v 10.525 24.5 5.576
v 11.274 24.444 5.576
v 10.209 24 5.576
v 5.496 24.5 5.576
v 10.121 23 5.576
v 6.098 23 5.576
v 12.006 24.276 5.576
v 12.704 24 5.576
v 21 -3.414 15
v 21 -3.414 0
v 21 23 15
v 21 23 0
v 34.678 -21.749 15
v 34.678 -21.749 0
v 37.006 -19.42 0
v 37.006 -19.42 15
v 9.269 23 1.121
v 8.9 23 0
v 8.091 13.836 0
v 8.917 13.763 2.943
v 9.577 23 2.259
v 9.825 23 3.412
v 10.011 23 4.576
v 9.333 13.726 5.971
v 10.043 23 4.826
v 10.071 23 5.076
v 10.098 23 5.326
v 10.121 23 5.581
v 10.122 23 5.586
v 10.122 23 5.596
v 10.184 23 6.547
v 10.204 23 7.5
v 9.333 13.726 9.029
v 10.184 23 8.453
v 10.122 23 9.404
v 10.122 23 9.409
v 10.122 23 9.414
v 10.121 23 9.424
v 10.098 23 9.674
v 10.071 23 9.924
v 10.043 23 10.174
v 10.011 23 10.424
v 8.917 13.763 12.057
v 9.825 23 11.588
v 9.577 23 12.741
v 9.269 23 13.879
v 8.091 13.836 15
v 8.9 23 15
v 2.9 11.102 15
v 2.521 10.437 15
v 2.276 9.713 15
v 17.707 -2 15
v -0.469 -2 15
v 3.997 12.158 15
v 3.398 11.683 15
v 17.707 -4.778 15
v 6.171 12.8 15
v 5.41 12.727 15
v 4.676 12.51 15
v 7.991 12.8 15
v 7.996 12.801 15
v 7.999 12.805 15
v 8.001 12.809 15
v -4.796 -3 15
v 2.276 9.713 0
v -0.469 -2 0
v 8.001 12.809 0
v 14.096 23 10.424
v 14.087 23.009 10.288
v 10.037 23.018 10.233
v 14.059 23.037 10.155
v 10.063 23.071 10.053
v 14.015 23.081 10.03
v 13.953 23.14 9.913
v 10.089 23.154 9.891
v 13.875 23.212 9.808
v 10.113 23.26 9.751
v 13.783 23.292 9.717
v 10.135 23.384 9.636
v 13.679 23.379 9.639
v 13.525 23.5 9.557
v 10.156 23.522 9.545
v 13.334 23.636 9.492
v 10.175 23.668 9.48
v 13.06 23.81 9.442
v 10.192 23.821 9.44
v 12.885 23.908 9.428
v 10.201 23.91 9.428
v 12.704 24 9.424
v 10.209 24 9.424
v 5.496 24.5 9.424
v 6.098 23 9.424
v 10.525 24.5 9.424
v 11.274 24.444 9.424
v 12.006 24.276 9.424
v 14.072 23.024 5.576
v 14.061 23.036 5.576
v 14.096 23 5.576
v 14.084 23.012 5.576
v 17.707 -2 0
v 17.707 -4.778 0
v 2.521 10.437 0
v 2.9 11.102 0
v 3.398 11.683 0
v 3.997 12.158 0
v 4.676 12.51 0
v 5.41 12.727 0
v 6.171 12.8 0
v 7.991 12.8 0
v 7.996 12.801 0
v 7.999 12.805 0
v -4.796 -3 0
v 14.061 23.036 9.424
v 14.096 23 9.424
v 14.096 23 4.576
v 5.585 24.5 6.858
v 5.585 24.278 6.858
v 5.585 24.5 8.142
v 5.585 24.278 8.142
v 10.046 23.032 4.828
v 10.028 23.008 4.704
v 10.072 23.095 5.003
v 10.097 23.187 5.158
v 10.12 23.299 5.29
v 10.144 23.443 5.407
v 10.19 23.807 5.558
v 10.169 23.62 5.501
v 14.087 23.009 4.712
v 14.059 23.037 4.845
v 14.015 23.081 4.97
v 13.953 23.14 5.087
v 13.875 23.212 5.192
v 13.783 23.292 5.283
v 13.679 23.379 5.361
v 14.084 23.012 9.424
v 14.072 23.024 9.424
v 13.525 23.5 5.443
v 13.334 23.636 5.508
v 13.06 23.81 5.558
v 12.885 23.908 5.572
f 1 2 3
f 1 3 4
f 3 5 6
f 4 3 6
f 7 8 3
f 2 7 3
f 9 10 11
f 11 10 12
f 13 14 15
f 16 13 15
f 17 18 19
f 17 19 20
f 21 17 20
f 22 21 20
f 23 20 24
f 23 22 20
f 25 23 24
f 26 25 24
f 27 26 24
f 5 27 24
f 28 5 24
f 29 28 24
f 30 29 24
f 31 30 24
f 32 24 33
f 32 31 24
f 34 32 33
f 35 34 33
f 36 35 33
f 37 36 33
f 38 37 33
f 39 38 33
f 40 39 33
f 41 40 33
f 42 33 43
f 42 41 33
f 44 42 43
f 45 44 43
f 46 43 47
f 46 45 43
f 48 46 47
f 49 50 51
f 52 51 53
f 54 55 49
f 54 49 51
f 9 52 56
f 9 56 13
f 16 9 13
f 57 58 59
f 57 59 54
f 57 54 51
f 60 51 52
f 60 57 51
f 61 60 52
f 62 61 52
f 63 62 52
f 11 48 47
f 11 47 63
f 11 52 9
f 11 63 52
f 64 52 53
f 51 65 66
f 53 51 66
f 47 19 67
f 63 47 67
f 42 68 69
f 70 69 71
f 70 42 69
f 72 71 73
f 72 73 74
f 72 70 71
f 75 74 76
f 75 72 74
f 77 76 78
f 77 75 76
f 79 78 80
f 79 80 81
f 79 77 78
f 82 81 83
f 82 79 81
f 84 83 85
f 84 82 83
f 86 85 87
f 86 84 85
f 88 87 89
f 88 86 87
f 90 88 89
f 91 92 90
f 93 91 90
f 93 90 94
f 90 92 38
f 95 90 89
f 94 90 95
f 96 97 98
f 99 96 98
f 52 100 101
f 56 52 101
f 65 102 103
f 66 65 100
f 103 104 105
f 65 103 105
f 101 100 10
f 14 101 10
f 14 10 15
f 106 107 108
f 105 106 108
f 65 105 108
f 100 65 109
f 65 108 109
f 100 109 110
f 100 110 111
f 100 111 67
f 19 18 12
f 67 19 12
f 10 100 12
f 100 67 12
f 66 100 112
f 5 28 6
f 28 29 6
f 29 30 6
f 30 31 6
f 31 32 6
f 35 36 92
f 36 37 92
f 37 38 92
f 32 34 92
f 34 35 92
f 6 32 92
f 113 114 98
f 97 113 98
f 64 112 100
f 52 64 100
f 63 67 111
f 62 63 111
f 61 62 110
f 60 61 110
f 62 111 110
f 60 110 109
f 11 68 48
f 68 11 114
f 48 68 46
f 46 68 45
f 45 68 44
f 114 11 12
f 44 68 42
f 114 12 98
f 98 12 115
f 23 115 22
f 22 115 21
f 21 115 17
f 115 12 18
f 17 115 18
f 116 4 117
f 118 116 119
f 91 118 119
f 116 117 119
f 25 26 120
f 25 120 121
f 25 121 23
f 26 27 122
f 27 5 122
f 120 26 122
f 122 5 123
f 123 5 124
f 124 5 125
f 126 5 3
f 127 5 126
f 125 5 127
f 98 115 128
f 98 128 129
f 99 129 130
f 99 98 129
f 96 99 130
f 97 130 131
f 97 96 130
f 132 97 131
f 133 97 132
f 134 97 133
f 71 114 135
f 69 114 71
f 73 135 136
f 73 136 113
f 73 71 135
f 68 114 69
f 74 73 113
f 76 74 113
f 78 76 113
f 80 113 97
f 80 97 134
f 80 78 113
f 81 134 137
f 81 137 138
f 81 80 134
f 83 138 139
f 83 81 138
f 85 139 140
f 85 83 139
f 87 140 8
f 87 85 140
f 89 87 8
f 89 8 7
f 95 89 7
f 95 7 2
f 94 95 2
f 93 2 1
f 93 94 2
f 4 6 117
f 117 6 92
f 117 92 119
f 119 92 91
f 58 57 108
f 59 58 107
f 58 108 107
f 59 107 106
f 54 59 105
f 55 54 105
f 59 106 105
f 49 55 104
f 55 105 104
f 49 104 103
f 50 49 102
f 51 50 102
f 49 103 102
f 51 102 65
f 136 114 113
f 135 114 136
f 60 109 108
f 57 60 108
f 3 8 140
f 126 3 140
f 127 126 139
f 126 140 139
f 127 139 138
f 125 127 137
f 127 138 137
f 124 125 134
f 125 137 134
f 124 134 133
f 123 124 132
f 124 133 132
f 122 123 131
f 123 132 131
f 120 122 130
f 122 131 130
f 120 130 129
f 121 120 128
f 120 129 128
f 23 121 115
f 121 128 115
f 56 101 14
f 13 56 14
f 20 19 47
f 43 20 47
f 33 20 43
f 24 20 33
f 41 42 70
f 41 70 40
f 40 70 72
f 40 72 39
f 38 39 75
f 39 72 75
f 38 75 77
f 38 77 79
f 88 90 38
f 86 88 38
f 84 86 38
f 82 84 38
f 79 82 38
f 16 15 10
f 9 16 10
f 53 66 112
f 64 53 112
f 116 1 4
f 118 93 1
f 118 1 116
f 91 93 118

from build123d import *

# Parameters (mm, degrees)
F1_DEPTH      = 15
F4_DEPTH      = 9.2
F4_DEPTH_BACK = 1
F7_DEPTH      = 1.5
F8_SIZE       = 1.49999
F9_R          = 5
F11_DEPTH     = 4
F12_T4_DEPTH  = 6.4753623201
F12_S5_R      = 22.299103121
F12_T6_DEPTH  = 5
F12_S8_R      = 5
F12_T9_DEPTH  = 5
F12_T13_DEPTH = 6.4753623415
F12_S15_R     = 5
F12_T16_DEPTH = 5
F12_S17_R     = 22.299103121
F12_T18_DEPTH = 5


# Not quite as in the source:
# - a fillet or chamfer that OpenCascade refuses, or shapes differently, is made with other operations: its cross-section is extruded or revolved along the edge and cut away or added
# - a fillet or chamfer is up to 0.001 mm smaller than in the source, because OpenCascade refuses the exact size


with BuildPart() as f1:
    # F0 (on Top) → F1 (new body)
    with BuildSketch(Plane.XY):
        with BuildLine():
            Line((37.0060966544, -19.4203102168), (21, -3.4142135624))
            Line((21, -3.4142135624), (21, 23))
            Line((21, 23), (8.9, 23))
            Line((8.9, 23), (8.0008047996, 12.8091210619))
            ThreePointArc((8.0008047996, 12.8091210619), (7.9975966714, 12.8026247244), (7.9908435011, 12.8))
            Line((7.9908435011, 12.8), (6.1708946074, 12.8))
            ThreePointArc((6.1708946074, 12.8), (3.6860466407, 11.9345702389), (2.2764293651, 9.7127652912))
            Line((2.2764293651, 9.7127652912), (-0.46875, -2))
            Line((-0.46875, -2), (-4.7960747033, -3))
            Line((-4.7960747033, -3), (17.7071067812, -2))
            Line((17.7071067812, -2), (17.7071067812, -4.7781745931))
            Line((17.7071067812, -4.7781745931), (34.6776695297, -21.7487373415))
            Line((34.6776695297, -21.7487373415), (37.0060966544, -19.4203102168))
        make_face()
    extrude(amount=F1_DEPTH)

    # F3 (on face) → F4 (cut, two sides)
    with BuildSketch(Plane(origin=(2.0824892704, 23.6015450644, 0), x_dir=(0.99612985, -0.0878938103, 0), z_dir=(-0.0878938103, -0.99612985, 0))) as f4_sk:
        with BuildLine():
            Line((6.8439980284, 15), (6.8439980284, 0))
            ThreePointArc((6.8439980284, 0), (8.1431011494, 7.5), (6.8439980284, 15))
        make_face()
    extrude(amount=F4_DEPTH, mode=Mode.SUBTRACT)
    extrude(f4_sk.sketch, amount=-F4_DEPTH_BACK, mode=Mode.SUBTRACT)

    # F6 (on offset) → F7 (join)
    with BuildSketch(Plane(origin=(0, 23, 0), x_dir=(-1, 0, 0), z_dir=(0, 1, 0))):
        with BuildLine():
            ThreePointArc((-7.0033527857, 9.4235612132), (-7.0960699027, 7.4999998768), (-7.0033527857, 5.5764385404))
            Line((-7.0033527857, 5.5764385404), (-5.4957957644, 5.5764385404))
            ThreePointArc((-5.4957957644, 5.5764385404), (-5.5960699027, 7.4999998768), (-5.4957957644, 9.4235612132))
            Line((-5.4957957644, 9.4235612132), (-7.0033527857, 9.4235612132))
        make_face()
        with BuildLine():
            Line((-14.0960699027, 7.4999998768), (-14.0960699027, 5.5764385404))
            Line((-14.0960699027, 5.5764385404), (-7.0033527857, 5.5764385404))
            ThreePointArc((-7.0033527857, 5.5764385404), (-7.0960699027, 7.4999998768), (-7.0033527857, 9.4235612132))
            Line((-7.0033527857, 9.4235612132), (-14.0960699027, 9.4235612132))
            Line((-14.0960699027, 9.4235612132), (-14.0960699027, 7.4999998768))
        make_face()
    extrude(amount=F7_DEPTH)

    # F8 (size 1.5 in the source; OpenCascade refuses exactly that, so slightly less here)
    f8_edges = [f1.edges().sort_by_distance(p)[0] for p in [
        (14.09607, 24.5, 7.5),
    ]]
    chamfer(f8_edges, length=F8_SIZE)

    # F9
    f9_edges = [f1.edges().sort_by_distance(p)[0] for p in [
        (12.59608, 24.5, 7.5),
    ]]
    fillet(f9_edges, radius=F9_R)

    # F10 (on face) → F11 (cut)
    with BuildSketch(Plane.XY.offset(9.4235612132)):
        Polygon((5.4957957644, 22), (6.5002299745, 22), (5.4957957644, 24.5), align=None)
    extrude(amount=-F11_DEPTH, mode=Mode.SUBTRACT)

    # F12: fillet of radius 1 on 3 edges, made by hand


with BuildPart() as f12_tool2:
    # F12_s3 → F12_t4 (new body)
    with BuildSketch(Plane.YZ.offset(7.6207075826)):
        with BuildLine():
            ThreePointArc((23, 10.4235612132), (23.2928932188, 9.716454432), (24, 9.4235612132))
            Line((24, 9.4235612132), (24, 9.4035612132))
            Line((24, 9.4035612132), (22.98, 9.4035612132))
            Line((22.98, 9.4035612132), (22.98, 10.4235612132))
            Line((22.98, 10.4235612132), (23, 10.4235612132))
        make_face()
    extrude(amount=F12_T4_DEPTH)

    # F12_s5 → F12_t6 (cut, symmetric)
    with BuildSketch(Plane(origin=(2.1446089712, 24.3055683406, 0), x_dir=(0, 0, 1), z_dir=(0.0878938103, 0.99612985, 0))):
        with Locations((7.5, -14.1560019716)):
            Circle(F12_S5_R)
    extrude(amount=F12_T6_DEPTH, both=True, mode=Mode.SUBTRACT)

    split(bisect_by=Plane.XZ.offset(-23), keep=Keep.BOTTOM)

    # F12_s8 → F12_t9 (intersect, symmetric)
    with BuildSketch(Plane.XY.offset(9.9)):
        with Locations((10.5250120908, 19.5)):
            Circle(F12_S8_R)
    extrude(amount=F12_T9_DEPTH, both=True, mode=Mode.INTERSECT)


with BuildPart() as f1_1:
    add(f1.part)

    # F12_t1: union F12_tool2
    add(f12_tool2.part)


with BuildPart() as f12_tool11:
    # F12_s12 → F12_t13 (new body)
    with BuildSketch(Plane.YZ.offset(14.0960699027)):
        with BuildLine():
            ThreePointArc((24, 5.5764385404), (23.2928932188, 5.2835453216), (23, 4.5764385404))
            Line((23, 4.5764385404), (22.98, 4.5764385404))
            Line((22.98, 4.5764385404), (22.98, 5.5964385404))
            Line((22.98, 5.5964385404), (24, 5.5964385404))
            Line((24, 5.5964385404), (24, 5.5764385404))
        make_face()
    extrude(amount=-F12_T13_DEPTH)

    split(bisect_by=Plane.XZ.offset(-23), keep=Keep.BOTTOM)

    # F12_s15 → F12_t16 (intersect, symmetric)
    with BuildSketch(Plane.XY.offset(5.1)):
        with Locations((10.5250120908, 19.5)):
            Circle(F12_S15_R)
    extrude(amount=F12_T16_DEPTH, both=True, mode=Mode.INTERSECT)

    # F12_s17 → F12_t18 (cut, symmetric)
    with BuildSketch(Plane(origin=(2.1446089712, 24.3055683406, 0), x_dir=(0, 0, 1), z_dir=(0.0878938103, 0.99612985, 0))):
        with Locations((7.5, -14.1560019716)):
            Circle(F12_S17_R)
    extrude(amount=F12_T18_DEPTH, both=True, mode=Mode.SUBTRACT)


with BuildPart() as f1_2:
    add(f1_1.part)

    # F12_t10: union F12_tool11
    add(f12_tool11.part)


solid = f1_2.part
